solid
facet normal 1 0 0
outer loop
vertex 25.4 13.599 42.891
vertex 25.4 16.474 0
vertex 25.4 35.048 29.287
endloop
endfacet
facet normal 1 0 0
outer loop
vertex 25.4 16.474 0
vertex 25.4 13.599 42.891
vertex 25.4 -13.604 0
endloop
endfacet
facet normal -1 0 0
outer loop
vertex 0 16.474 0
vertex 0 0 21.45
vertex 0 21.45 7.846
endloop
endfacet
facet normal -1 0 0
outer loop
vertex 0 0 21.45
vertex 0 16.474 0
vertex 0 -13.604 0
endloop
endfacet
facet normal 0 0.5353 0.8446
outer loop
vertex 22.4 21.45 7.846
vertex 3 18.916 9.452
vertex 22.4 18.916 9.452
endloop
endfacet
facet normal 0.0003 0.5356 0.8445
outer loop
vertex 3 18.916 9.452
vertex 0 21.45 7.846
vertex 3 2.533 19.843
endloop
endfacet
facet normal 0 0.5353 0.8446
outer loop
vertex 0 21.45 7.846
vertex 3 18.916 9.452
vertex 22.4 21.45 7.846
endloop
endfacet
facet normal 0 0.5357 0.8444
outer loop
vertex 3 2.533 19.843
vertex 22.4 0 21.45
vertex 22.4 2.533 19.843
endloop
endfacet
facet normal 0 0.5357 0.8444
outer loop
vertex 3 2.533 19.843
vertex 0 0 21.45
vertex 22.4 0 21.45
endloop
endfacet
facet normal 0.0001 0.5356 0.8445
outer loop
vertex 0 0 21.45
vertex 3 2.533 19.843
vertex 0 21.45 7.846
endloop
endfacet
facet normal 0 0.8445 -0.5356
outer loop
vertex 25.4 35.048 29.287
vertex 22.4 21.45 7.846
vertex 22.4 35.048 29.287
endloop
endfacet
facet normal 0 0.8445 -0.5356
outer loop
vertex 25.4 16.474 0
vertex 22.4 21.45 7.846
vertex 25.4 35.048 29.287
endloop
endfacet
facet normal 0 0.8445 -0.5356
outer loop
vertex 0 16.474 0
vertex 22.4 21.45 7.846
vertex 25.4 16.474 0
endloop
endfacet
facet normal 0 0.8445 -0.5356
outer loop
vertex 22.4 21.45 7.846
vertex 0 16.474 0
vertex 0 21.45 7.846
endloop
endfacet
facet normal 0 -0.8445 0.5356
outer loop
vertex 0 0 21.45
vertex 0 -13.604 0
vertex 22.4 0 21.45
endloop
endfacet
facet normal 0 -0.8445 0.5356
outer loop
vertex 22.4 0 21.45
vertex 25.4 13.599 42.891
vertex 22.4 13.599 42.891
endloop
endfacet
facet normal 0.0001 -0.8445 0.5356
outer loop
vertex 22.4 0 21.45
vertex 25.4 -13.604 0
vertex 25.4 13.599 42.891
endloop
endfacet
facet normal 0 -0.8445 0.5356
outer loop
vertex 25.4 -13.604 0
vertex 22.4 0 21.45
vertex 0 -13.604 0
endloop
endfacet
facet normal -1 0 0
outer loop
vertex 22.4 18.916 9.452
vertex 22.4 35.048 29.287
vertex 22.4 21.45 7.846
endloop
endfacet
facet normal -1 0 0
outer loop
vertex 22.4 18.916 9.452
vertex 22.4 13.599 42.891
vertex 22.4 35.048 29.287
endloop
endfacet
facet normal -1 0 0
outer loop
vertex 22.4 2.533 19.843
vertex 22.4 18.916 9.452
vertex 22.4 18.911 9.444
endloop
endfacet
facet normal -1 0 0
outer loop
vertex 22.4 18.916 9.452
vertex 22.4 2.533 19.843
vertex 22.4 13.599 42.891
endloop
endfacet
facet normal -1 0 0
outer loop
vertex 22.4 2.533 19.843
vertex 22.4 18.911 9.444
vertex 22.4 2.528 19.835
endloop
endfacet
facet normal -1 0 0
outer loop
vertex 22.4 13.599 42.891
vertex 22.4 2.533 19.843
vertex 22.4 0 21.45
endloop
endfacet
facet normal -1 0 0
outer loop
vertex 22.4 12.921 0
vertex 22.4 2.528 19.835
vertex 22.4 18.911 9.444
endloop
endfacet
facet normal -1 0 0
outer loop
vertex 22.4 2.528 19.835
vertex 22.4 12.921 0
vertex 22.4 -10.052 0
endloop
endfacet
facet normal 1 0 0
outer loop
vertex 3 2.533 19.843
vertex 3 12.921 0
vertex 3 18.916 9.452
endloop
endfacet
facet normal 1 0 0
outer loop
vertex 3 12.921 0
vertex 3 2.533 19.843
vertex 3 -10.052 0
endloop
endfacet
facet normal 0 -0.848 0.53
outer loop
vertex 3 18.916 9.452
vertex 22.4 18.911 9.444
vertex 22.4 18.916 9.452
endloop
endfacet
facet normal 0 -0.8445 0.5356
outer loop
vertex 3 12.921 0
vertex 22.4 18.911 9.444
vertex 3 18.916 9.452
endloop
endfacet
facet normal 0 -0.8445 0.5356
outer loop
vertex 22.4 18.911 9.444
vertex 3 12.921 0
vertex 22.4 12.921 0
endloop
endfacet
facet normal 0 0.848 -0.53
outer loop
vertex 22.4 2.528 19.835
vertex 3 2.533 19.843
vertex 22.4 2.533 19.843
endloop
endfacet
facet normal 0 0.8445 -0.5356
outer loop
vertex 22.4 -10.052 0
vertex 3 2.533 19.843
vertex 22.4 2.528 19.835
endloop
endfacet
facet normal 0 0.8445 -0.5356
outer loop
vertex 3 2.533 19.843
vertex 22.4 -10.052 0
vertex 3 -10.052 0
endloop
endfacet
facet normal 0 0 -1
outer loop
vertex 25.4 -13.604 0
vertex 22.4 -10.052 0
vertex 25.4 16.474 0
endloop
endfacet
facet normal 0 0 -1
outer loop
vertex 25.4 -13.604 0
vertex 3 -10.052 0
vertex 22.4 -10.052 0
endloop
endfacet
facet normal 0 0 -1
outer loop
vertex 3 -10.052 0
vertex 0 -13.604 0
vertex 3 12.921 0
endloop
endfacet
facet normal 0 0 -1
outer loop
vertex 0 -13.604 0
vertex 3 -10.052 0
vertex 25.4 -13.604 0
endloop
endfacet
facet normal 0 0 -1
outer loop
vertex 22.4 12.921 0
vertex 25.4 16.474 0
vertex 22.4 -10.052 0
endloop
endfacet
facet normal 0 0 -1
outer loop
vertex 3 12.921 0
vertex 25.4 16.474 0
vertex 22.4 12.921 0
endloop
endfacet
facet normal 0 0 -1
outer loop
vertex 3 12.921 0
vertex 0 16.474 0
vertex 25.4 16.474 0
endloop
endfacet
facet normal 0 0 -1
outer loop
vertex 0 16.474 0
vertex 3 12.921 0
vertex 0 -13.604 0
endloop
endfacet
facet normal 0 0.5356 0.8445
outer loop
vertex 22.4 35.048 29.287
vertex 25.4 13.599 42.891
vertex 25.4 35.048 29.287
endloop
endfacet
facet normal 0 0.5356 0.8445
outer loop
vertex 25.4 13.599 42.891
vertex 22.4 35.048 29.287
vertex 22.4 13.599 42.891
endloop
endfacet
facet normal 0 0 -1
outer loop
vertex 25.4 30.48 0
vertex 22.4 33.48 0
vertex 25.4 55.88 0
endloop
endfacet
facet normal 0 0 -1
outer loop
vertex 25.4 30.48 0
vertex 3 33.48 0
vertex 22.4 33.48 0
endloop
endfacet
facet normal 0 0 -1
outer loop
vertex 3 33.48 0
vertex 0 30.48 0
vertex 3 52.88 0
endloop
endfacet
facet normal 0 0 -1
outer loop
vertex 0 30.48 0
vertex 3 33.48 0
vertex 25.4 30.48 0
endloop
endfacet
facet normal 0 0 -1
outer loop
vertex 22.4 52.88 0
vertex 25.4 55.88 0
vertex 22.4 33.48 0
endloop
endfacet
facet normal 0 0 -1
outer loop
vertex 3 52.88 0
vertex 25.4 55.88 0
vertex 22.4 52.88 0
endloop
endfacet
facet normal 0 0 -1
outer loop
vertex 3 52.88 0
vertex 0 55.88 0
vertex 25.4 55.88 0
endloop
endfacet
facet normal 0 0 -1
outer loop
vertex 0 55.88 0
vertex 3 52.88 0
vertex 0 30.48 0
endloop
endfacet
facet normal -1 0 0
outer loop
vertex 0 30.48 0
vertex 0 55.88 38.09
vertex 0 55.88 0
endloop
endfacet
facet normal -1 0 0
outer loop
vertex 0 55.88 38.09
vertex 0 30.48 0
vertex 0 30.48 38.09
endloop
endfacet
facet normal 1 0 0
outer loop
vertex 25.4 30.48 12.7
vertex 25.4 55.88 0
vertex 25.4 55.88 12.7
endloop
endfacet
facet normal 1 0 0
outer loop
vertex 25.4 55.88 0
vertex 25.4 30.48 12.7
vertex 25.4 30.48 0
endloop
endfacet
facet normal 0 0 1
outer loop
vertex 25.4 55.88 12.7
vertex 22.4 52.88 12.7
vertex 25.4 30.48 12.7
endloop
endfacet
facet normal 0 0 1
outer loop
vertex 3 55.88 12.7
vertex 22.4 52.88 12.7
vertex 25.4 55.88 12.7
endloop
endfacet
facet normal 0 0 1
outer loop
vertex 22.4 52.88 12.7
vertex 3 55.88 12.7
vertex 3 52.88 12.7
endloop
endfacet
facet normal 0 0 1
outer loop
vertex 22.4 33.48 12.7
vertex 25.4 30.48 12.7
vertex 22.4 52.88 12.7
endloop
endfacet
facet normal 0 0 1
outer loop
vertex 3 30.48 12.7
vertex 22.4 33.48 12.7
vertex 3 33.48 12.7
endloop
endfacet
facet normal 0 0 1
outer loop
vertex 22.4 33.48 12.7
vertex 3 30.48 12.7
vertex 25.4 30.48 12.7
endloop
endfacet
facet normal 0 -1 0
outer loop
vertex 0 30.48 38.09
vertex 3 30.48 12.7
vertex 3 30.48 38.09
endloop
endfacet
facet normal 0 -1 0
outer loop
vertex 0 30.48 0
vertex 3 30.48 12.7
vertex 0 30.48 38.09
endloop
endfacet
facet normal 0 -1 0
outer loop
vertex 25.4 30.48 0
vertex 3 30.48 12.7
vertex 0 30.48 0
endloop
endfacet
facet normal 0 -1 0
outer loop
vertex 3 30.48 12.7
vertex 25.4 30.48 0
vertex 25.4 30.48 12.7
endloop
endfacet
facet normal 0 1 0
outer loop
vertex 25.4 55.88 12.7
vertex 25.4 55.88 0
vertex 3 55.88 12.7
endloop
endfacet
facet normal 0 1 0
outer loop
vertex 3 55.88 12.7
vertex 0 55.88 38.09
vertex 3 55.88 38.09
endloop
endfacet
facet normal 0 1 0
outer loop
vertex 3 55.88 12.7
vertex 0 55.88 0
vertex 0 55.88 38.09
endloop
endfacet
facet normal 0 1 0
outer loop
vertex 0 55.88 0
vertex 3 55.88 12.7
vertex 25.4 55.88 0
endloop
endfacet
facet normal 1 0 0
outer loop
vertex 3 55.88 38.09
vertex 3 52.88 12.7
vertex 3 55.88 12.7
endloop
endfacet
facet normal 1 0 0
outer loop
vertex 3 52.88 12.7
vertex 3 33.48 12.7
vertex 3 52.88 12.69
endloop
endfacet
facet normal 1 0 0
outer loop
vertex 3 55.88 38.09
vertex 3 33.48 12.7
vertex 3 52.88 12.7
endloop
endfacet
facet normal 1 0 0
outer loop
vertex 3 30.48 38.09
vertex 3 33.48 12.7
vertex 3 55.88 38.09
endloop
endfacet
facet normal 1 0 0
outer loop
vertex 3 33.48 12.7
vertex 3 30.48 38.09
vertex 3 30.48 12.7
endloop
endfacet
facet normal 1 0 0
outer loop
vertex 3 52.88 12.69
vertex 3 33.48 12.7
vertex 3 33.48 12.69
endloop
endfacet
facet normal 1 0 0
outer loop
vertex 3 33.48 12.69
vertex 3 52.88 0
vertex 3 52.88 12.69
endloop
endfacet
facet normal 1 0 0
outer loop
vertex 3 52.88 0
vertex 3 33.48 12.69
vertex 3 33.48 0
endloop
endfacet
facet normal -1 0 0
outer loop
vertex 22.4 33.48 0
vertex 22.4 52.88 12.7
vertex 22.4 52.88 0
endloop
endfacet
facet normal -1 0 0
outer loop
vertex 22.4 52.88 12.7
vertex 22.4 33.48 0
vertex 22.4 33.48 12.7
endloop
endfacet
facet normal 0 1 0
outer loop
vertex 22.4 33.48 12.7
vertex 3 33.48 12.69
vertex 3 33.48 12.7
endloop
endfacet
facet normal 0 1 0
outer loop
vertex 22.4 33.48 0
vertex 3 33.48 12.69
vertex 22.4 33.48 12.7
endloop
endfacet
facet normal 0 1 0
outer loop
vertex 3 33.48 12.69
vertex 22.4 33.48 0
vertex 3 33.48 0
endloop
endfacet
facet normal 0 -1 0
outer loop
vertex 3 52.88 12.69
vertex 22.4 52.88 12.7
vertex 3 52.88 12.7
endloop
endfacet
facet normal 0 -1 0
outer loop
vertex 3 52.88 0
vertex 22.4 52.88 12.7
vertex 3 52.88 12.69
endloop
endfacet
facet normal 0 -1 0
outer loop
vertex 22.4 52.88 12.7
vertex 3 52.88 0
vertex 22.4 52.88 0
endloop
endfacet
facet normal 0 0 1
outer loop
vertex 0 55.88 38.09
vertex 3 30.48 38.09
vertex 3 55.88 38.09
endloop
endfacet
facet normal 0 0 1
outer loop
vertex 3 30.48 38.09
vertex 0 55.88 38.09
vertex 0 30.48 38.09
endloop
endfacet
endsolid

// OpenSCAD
// file: roundedcube.scad
// From https://danielupshaw.com/openscad-rounded-corners/

// Higher definition curves
$fs = 0.01;

module roundedcube(size = [1, 1, 1], center = false, radius = 0.5, apply_to = "all") {
	// If single value, convert to [x, y, z] vector
	size = (size[0] == undef) ? [size, size, size] : size;

	translate_min = radius;
	translate_xmax = size[0] - radius;
	translate_ymax = size[1] - radius;
	translate_zmax = size[2] - radius;

	diameter = radius * 2;

	module build_point(type = "sphere", rotate = [0, 0, 0]) {
		if (type == "sphere") {
			sphere(r = radius);
		} else if (type == "cylinder") {
			rotate(a = rotate)
			cylinder(h = diameter, r = radius, center = true);
		}
	}

	obj_translate = (center == false) ?
		[0, 0, 0] : [
			-(size[0] / 2),
			-(size[1] / 2),
			-(size[2] / 2)
		];

	translate(v = obj_translate) {
		hull() {
			for (translate_x = [translate_min, translate_xmax]) {
				x_at = (translate_x == translate_min) ? "min" : "max";
				for (translate_y = [translate_min, translate_ymax]) {
					y_at = (translate_y == translate_min) ? "min" : "max";
					for (translate_z = [translate_min, translate_zmax]) {
						z_at = (translate_z == translate_min) ? "min" : "max";

						translate(v = [translate_x, translate_y, translate_z])
						if (
							(apply_to == "all") ||
							(apply_to == "xmin" && x_at == "min") || (apply_to == "xmax" && x_at == "max") ||
							(apply_to == "ymin" && y_at == "min") || (apply_to == "ymax" && y_at == "max") ||
							(apply_to == "zmin" && z_at == "min") || (apply_to == "zmax" && z_at == "max")
						) {
							build_point("sphere");
						} else {
							rotate = 
								(apply_to == "xmin" || apply_to == "xmax" || apply_to == "x") ? [0, 90, 0] : (
								(apply_to == "ymin" || apply_to == "ymax" || apply_to == "y") ? [90, 90, 0] :
								[0, 0, 0]
							);
							build_point("cylinder", rotate);
						}
					}
				}
			}
		}
	}
}
// file: monitor_stand.scad
include <roundedcube.scad>;

EPS = 0.01;
LEG_W = 19.40;  // Include any extra clearance desired.
THICKNESS = 3.0; // Used for most walls
BASE_THICKNESS = 5.0;
SLEEVE = 35.0;
FOOT_RADIUS = 2.0;
SPANNER_L = 45.0;
SCREW_HOLE_D1 = 4.25;
SCREW_HOLE_D2 = 7.85;
SCREW_HOLE_H = 2.80;

OVERALL_H = 155.0; // Height from bottom of supports to top
OVERALL_D = 232.0; // Depth from front to back
OVERALL_W = 550.0;  // Only needed for assembly demo
TOP_THICKNESS = 20.0;  // Only needed for assembly demo

// Calculations to work out slant distance
x_cross = OVERALL_D - 2*(LEG_W + 2*THICKNESS);
y_cross = OVERALL_H - 2*BASE_THICKNESS;
x_1 = LEG_W + 2*THICKNESS;
// Need to solve x_cross * tan(theta) = y_cross - x_1 / cos(theta)
// Can solve this with a little trig:
A = sqrt(x_cross*x_cross + y_cross*y_cross);
alpha = asin(y_cross / A);
theta = alpha - asin(x_1 / A);

echo("Theta: ", theta);

module bottom_connector(include_angle) {
    difference() {
        roundedcube([LEG_W + 2*THICKNESS, LEG_W + 2*THICKNESS,
            BASE_THICKNESS + SLEEVE], radius=FOOT_RADIUS)
        translate([0, 0, FOOT_RADIUS]);
        
        translate([THICKNESS, THICKNESS, BASE_THICKNESS])
        cube([LEG_W, LEG_W, SLEEVE + EPS]);
    }
    
    if (include_angle) {
        // Sleeve length for angled piece
        s2 = (SLEEVE - cos(theta) * x_1) / sin(theta);
        
        difference() {
            translate([+x_1, 0, BASE_THICKNESS])
            rotate([0, 90 - theta, 0])
            translate([-x_1, 0, 0])
            difference() {
                roundedcube([LEG_W + 2*THICKNESS, LEG_W + 2*THICKNESS,
                    s2], radius=FOOT_RADIUS,
                    apply_to="zmax");

                translate([THICKNESS, THICKNESS, 0])
                cube([LEG_W, LEG_W, SLEEVE + EPS]);
            }
            translate([0, -EPS, 0])
            cube([x_1 - FOOT_RADIUS, x_1, SLEEVE+BASE_THICKNESS]);
        }
    }
}

module top_connector(include_angle) {
    difference() {
        roundedcube([LEG_W + 2*THICKNESS, LEG_W + 2*THICKNESS,
            BASE_THICKNESS + SLEEVE], radius=FOOT_RADIUS,
            apply_to="zmax");

        translate([THICKNESS, THICKNESS, BASE_THICKNESS])
        cube([LEG_W, LEG_W, SLEEVE + EPS]);
    }
    // Segments that screw holes will go into ('spanners')
    translate([LEG_W + 2*THICKNESS - 2*FOOT_RADIUS, 0, 0])
    difference() {
        roundedcube([SPANNER_L + 2*FOOT_RADIUS, LEG_W + 2*THICKNESS, BASE_THICKNESS], radius=FOOT_RADIUS, apply_to="zmax");
        
        union() {
            translate([2*FOOT_RADIUS + 0.8*SPANNER_L, x_1/2, -EPS])
            union() {
                cylinder(r=SCREW_HOLE_D1/2, h=BASE_THICKNESS + 2*EPS);
                translate([0, 0, BASE_THICKNESS - SCREW_HOLE_H])
                cylinder(r1=SCREW_HOLE_D1/2, r2=SCREW_HOLE_D2/2, h=SCREW_HOLE_H+EPS);
            }
        }
    }
    
    translate([0, LEG_W + 2*THICKNESS - 2*FOOT_RADIUS, 0])
    difference() {
        roundedcube([ LEG_W + 2*THICKNESS, SPANNER_L + 2*FOOT_RADIUS, BASE_THICKNESS], radius=FOOT_RADIUS, apply_to="zmax");
        
        union() {
            translate([x_1/2, 2*FOOT_RADIUS + 0.8*SPANNER_L, -EPS])
            union() {
                cylinder(r=SCREW_HOLE_D1/2, h=BASE_THICKNESS + 2*EPS);
                translate([0, 0, BASE_THICKNESS - SCREW_HOLE_H])
                cylinder(r1=SCREW_HOLE_D1/2, r2=SCREW_HOLE_D2/2, h=SCREW_HOLE_H+EPS);
            }
            
            translate([x_1/2, 2*FOOT_RADIUS + 0.3*SPANNER_L, -EPS])
            union() {
                cylinder(r=SCREW_HOLE_D1/2, h=BASE_THICKNESS + 2*EPS);
                translate([0, 0, BASE_THICKNESS - SCREW_HOLE_H])
                cylinder(r1=SCREW_HOLE_D1/2, r2=SCREW_HOLE_D2/2, h=SCREW_HOLE_H+EPS);
            }
        }
        
    }
    
    if (include_angle) {
        // Sleeve length for angled piece
        s2 = (SLEEVE - cos(theta) * x_1) / sin(theta);
        
        difference() {
            translate([+x_1, 0, BASE_THICKNESS])
            rotate([0, 90 - theta, 0])
            translate([-x_1, 0, 0])
            difference() {
                roundedcube([LEG_W + 2*THICKNESS, LEG_W + 2*THICKNESS,
                    s2], radius=FOOT_RADIUS,
                    apply_to="zmax");

                translate([THICKNESS, THICKNESS, 0])
                cube([LEG_W, LEG_W, SLEEVE + EPS]);
            }
            translate([0, -EPS, 0])
            cube([x_1 - FOOT_RADIUS, x_1, SLEEVE+BASE_THICKNESS]);
        }
    }
}

module single_side_assembly() {
    color("black", 1.0)
    union() {
        bottom_connector(include_angle=true);
        
        translate([0, 0, OVERALL_H])
        rotate([180, 0, 90])
        top_connector(include_angle=false);
        
        translate([OVERALL_D - x_1, 0, 0])
        bottom_connector(include_angle=false);
        
        translate([OVERALL_D, 0, OVERALL_H])
        rotate([180, 0, 180])
        top_connector(include_angle=true);
    }
    
    // Steel pieces
    color("black", 1.0)
    union() {
        leg1_h = OVERALL_H - 2*BASE_THICKNESS;
        echo("Vertical leg length: ", leg1_h);
        
        translate([THICKNESS, THICKNESS, BASE_THICKNESS])
        cube([LEG_W, LEG_W, leg1_h]);
        translate([OVERALL_D - LEG_W - THICKNESS, THICKNESS, BASE_THICKNESS])
        cube([LEG_W, LEG_W, leg1_h]);
        
        leg2_h = x_cross / cos(theta);
        echo("Diagonal leg length: ", leg2_h);
        
        translate([x_1 - FOOT_RADIUS, THICKNESS, BASE_THICKNESS + THICKNESS*cos(theta)])
        rotate([0, -theta, 0])
        multmatrix(m = [ [1, 0, tan(theta), 0],
                         [0, 1, 0, 0],
                         [0, 0, 1, 0]]) {
            cube([leg2_h, LEG_W, LEG_W]);
        }
    }
}

module assembly_demo() {
    single_side_assembly();
    
    translate([OVERALL_D, OVERALL_W, 0])
    rotate([0, 0, 180])
    single_side_assembly();
    
    color("saddlebrown", 1.0)
    translate([0, 0, OVERALL_H])
    cube([OVERALL_D, OVERALL_W, TOP_THICKNESS]);
}

//assembly_demo();

//top_connector(include_angle=true);
// main file
include <monitor_stand.scad>

x_outer = LEG_W + 2*THICKNESS;

module cutting_jig() {
    difference() {
        difference() {
            cube([x_outer, x_outer, x_outer]);
            translate([-EPS, THICKNESS, THICKNESS])
            cube([x_outer + 2*EPS, LEG_W, LEG_W]);
        }
        
        translate([x_outer, 0, -EPS])
        rotate([0, 0, theta])
        cube([x_outer*sin(theta) + EPS, x_outer/cos(theta) + EPS, x_outer+2*EPS]);
    }
    
    translate([-x_outer + EPS, 0, x_outer-THICKNESS])
    cube([x_outer, x_outer, THICKNESS]);
}

module cutting_jig_basic() {
    difference() {
        cube([x_outer*.5, x_outer, x_outer]);
        translate([-EPS, THICKNESS, THICKNESS])
        cube([x_outer*.5 + 2*EPS, LEG_W, LEG_W]);
    }
    
    translate([-x_outer + EPS, 0, x_outer-THICKNESS])
    cube([x_outer, x_outer, THICKNESS]);
}

rotate([0, 90, 0])
translate([-x_outer*cos(theta), 0, 0])
rotate([0, 0, -theta])
cutting_jig();

translate([x_outer, 2.2*x_outer, 0])
rotate([0, 90, 180])
translate([-x_outer*.5, 0, 0])
cutting_jig_basic();
